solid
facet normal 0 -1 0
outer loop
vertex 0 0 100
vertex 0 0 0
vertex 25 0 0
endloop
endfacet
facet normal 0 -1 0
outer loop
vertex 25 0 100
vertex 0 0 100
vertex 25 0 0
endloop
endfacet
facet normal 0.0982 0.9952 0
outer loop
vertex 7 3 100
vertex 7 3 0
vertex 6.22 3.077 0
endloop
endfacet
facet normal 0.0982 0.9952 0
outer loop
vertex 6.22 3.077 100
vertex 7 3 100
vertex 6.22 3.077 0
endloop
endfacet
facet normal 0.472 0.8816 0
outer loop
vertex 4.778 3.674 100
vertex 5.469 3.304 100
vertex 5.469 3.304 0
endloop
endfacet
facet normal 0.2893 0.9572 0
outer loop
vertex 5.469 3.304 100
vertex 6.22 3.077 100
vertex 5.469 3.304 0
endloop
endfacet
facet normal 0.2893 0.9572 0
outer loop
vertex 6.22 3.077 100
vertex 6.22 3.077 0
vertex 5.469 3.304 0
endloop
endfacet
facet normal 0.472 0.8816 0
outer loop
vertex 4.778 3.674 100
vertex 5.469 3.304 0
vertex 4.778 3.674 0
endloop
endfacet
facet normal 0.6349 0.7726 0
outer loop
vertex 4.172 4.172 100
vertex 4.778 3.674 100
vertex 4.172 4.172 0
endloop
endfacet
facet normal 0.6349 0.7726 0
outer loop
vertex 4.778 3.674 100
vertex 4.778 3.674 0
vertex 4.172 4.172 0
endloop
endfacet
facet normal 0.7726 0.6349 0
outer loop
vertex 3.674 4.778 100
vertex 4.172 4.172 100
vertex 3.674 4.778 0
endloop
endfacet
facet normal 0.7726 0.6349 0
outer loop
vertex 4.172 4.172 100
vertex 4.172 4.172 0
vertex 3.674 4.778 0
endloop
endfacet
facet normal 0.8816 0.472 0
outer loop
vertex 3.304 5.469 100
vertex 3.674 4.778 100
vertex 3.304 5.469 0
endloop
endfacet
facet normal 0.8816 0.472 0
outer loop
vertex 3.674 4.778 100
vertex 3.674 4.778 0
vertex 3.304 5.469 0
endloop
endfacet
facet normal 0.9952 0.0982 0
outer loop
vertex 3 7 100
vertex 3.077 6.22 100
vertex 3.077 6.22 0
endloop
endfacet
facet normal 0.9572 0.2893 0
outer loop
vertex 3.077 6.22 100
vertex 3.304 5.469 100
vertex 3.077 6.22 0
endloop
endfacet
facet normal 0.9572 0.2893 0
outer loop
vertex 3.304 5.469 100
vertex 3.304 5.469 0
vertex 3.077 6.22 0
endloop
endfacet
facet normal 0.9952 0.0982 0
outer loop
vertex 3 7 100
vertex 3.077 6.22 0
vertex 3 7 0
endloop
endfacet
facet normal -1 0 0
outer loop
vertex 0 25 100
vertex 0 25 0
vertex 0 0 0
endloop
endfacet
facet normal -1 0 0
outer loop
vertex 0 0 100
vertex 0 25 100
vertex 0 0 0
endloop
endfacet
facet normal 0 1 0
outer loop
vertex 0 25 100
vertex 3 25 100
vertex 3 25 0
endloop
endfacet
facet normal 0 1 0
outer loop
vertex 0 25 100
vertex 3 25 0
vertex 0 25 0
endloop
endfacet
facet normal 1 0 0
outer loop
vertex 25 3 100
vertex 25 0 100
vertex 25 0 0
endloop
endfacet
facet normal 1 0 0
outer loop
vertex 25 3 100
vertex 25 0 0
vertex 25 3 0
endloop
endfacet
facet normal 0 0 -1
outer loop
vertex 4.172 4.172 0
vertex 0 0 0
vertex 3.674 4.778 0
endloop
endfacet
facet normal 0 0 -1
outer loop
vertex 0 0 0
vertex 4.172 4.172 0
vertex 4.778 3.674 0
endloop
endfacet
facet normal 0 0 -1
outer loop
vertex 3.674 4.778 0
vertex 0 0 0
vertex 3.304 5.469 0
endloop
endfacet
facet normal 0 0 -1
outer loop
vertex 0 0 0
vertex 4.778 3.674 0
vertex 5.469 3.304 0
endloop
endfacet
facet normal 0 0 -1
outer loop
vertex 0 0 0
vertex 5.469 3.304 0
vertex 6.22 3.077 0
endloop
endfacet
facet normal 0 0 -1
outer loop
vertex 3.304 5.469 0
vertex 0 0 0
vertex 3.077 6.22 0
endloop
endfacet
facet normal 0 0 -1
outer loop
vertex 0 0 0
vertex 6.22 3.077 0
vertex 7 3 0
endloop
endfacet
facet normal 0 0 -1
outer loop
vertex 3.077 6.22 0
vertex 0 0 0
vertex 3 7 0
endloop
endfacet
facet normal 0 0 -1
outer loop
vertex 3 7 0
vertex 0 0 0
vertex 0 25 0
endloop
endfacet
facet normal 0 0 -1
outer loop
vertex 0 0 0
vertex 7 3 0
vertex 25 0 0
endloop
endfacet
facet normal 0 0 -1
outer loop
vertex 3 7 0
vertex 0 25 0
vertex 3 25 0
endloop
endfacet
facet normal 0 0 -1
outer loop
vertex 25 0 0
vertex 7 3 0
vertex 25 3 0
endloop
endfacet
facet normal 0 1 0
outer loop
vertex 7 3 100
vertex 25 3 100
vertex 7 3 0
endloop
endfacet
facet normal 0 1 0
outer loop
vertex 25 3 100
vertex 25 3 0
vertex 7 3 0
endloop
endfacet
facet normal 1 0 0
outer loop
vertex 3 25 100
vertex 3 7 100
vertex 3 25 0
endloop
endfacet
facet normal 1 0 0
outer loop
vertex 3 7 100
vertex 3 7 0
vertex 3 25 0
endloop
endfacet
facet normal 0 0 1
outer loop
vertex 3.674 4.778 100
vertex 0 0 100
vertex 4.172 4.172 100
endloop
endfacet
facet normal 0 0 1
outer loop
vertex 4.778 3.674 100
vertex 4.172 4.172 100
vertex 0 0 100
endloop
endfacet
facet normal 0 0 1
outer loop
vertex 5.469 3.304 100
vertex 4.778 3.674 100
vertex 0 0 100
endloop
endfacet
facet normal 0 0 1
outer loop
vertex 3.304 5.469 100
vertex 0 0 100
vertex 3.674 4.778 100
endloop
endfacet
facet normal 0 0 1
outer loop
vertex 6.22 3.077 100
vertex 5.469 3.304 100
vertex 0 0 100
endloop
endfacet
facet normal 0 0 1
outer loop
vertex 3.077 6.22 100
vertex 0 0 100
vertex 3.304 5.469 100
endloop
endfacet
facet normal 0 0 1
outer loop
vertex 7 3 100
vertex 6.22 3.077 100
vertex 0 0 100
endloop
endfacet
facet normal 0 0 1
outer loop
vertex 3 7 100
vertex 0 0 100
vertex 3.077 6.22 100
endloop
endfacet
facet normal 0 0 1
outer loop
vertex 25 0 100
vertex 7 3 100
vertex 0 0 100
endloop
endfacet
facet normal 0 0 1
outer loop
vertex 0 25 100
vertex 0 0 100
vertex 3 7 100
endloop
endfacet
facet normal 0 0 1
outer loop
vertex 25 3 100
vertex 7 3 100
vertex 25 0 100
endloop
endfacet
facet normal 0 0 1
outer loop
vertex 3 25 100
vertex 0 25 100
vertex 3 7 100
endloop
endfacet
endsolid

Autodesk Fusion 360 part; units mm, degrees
sketch "スケッチ1" plane through (0, 0, 0) normal (0, 0, 1) x (1, 0, 0)
  line L0 (0, 25) -> (0, 0)
  line L1 (3, 7) -> (3, 25)
  arc A0 (3, 7) -> (7, 3) centre (7, 7) ccw
  line L2 (0, 0) -> (25, 0)
  line L3 (25, 3) -> (7, 3)
  line L4 (25, 0) -> (25, 3)
  line L5 (3, 25) -> (0, 25)
extrude "押し出し1" add sketch "スケッチ1" along normal blind 100
